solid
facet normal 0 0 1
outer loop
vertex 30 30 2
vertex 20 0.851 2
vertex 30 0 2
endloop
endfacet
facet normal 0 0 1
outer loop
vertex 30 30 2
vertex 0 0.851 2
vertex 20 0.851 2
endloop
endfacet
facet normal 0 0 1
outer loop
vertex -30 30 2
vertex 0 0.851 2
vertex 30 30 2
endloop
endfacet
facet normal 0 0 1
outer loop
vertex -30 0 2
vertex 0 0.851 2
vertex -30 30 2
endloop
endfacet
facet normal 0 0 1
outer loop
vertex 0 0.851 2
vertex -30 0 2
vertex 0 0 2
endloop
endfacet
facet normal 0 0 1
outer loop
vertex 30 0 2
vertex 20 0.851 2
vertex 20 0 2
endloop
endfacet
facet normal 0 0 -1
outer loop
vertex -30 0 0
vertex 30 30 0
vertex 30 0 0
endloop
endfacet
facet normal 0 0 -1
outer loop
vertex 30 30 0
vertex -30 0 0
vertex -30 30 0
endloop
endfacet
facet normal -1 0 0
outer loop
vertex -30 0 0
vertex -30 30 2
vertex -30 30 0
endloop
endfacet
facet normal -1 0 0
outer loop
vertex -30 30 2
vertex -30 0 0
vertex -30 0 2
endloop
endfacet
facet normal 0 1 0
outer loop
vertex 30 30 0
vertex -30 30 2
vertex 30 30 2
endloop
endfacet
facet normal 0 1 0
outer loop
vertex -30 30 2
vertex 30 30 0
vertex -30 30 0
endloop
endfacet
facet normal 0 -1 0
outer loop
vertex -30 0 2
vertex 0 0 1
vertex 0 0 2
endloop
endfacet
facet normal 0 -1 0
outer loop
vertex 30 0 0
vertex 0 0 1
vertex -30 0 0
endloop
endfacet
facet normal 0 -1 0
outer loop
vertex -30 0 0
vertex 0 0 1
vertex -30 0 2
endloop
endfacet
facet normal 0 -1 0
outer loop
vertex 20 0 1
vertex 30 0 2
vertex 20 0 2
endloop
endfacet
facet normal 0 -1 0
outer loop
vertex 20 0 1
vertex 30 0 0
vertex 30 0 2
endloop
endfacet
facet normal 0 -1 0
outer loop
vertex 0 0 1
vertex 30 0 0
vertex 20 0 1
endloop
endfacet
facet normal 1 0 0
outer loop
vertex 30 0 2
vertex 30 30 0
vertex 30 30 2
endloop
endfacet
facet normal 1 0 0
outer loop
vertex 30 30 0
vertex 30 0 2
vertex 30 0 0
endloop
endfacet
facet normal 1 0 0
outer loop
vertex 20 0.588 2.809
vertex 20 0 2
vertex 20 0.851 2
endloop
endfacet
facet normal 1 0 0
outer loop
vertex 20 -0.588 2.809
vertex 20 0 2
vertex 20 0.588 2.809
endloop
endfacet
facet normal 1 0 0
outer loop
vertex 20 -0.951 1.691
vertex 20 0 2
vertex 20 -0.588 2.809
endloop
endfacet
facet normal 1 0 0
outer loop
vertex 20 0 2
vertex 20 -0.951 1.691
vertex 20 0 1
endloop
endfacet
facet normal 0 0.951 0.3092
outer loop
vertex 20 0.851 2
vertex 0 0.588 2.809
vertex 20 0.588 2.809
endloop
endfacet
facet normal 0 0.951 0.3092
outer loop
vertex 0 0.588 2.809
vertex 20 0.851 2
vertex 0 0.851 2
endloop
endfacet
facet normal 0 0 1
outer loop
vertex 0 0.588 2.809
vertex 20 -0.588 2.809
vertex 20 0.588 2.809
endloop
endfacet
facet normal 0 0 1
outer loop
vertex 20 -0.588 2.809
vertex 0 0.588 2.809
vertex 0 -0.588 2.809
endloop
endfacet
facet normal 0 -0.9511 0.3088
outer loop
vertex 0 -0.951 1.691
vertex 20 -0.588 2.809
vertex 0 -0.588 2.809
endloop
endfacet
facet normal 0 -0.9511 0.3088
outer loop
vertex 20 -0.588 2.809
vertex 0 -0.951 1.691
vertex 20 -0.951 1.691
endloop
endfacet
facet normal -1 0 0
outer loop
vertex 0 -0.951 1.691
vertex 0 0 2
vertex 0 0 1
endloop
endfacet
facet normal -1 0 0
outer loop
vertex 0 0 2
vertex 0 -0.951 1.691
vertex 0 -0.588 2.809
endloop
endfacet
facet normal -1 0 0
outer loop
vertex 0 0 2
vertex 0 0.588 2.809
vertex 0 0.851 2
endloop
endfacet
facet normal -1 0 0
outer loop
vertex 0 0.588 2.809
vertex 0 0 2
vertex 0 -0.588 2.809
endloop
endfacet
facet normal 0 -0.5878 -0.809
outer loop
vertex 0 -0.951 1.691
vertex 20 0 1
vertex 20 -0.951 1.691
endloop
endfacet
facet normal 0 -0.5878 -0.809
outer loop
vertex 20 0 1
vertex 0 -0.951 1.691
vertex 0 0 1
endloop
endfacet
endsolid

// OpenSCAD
// file: use_lib.scad
// Library pulled in via `use <>`: only module/function definitions are
// imported; this top-level geometry must NOT appear in the consumer.
function beam_r(len) = len / 40 + 0.5;

module beam(len = 10) {
    rotate([0, 90, 0]) cylinder(h = len, r = beam_r(len));
}

// Top-level geometry that `use` consumers must ignore.
beam(100);
// file: include_lib.scad
// Library pulled in via `include <>`: definitions AND top-level geometry
// become part of the including file.
plate_w = 30;
plate_h = 2;

module plate() {
    cube([plate_w, plate_w, plate_h]);
}

// Top-level geometry: `include` executes this, `use` would not.
translate([-plate_w, 0, 0]) plate();
// main file
// Multi-file directives. The referenced files live next to this one.
include <include_lib.scad>
use <use_lib.scad>

// Geometry that relies on the included/used definitions.
plate();
translate([0, 0, plate_h]) beam(20);
